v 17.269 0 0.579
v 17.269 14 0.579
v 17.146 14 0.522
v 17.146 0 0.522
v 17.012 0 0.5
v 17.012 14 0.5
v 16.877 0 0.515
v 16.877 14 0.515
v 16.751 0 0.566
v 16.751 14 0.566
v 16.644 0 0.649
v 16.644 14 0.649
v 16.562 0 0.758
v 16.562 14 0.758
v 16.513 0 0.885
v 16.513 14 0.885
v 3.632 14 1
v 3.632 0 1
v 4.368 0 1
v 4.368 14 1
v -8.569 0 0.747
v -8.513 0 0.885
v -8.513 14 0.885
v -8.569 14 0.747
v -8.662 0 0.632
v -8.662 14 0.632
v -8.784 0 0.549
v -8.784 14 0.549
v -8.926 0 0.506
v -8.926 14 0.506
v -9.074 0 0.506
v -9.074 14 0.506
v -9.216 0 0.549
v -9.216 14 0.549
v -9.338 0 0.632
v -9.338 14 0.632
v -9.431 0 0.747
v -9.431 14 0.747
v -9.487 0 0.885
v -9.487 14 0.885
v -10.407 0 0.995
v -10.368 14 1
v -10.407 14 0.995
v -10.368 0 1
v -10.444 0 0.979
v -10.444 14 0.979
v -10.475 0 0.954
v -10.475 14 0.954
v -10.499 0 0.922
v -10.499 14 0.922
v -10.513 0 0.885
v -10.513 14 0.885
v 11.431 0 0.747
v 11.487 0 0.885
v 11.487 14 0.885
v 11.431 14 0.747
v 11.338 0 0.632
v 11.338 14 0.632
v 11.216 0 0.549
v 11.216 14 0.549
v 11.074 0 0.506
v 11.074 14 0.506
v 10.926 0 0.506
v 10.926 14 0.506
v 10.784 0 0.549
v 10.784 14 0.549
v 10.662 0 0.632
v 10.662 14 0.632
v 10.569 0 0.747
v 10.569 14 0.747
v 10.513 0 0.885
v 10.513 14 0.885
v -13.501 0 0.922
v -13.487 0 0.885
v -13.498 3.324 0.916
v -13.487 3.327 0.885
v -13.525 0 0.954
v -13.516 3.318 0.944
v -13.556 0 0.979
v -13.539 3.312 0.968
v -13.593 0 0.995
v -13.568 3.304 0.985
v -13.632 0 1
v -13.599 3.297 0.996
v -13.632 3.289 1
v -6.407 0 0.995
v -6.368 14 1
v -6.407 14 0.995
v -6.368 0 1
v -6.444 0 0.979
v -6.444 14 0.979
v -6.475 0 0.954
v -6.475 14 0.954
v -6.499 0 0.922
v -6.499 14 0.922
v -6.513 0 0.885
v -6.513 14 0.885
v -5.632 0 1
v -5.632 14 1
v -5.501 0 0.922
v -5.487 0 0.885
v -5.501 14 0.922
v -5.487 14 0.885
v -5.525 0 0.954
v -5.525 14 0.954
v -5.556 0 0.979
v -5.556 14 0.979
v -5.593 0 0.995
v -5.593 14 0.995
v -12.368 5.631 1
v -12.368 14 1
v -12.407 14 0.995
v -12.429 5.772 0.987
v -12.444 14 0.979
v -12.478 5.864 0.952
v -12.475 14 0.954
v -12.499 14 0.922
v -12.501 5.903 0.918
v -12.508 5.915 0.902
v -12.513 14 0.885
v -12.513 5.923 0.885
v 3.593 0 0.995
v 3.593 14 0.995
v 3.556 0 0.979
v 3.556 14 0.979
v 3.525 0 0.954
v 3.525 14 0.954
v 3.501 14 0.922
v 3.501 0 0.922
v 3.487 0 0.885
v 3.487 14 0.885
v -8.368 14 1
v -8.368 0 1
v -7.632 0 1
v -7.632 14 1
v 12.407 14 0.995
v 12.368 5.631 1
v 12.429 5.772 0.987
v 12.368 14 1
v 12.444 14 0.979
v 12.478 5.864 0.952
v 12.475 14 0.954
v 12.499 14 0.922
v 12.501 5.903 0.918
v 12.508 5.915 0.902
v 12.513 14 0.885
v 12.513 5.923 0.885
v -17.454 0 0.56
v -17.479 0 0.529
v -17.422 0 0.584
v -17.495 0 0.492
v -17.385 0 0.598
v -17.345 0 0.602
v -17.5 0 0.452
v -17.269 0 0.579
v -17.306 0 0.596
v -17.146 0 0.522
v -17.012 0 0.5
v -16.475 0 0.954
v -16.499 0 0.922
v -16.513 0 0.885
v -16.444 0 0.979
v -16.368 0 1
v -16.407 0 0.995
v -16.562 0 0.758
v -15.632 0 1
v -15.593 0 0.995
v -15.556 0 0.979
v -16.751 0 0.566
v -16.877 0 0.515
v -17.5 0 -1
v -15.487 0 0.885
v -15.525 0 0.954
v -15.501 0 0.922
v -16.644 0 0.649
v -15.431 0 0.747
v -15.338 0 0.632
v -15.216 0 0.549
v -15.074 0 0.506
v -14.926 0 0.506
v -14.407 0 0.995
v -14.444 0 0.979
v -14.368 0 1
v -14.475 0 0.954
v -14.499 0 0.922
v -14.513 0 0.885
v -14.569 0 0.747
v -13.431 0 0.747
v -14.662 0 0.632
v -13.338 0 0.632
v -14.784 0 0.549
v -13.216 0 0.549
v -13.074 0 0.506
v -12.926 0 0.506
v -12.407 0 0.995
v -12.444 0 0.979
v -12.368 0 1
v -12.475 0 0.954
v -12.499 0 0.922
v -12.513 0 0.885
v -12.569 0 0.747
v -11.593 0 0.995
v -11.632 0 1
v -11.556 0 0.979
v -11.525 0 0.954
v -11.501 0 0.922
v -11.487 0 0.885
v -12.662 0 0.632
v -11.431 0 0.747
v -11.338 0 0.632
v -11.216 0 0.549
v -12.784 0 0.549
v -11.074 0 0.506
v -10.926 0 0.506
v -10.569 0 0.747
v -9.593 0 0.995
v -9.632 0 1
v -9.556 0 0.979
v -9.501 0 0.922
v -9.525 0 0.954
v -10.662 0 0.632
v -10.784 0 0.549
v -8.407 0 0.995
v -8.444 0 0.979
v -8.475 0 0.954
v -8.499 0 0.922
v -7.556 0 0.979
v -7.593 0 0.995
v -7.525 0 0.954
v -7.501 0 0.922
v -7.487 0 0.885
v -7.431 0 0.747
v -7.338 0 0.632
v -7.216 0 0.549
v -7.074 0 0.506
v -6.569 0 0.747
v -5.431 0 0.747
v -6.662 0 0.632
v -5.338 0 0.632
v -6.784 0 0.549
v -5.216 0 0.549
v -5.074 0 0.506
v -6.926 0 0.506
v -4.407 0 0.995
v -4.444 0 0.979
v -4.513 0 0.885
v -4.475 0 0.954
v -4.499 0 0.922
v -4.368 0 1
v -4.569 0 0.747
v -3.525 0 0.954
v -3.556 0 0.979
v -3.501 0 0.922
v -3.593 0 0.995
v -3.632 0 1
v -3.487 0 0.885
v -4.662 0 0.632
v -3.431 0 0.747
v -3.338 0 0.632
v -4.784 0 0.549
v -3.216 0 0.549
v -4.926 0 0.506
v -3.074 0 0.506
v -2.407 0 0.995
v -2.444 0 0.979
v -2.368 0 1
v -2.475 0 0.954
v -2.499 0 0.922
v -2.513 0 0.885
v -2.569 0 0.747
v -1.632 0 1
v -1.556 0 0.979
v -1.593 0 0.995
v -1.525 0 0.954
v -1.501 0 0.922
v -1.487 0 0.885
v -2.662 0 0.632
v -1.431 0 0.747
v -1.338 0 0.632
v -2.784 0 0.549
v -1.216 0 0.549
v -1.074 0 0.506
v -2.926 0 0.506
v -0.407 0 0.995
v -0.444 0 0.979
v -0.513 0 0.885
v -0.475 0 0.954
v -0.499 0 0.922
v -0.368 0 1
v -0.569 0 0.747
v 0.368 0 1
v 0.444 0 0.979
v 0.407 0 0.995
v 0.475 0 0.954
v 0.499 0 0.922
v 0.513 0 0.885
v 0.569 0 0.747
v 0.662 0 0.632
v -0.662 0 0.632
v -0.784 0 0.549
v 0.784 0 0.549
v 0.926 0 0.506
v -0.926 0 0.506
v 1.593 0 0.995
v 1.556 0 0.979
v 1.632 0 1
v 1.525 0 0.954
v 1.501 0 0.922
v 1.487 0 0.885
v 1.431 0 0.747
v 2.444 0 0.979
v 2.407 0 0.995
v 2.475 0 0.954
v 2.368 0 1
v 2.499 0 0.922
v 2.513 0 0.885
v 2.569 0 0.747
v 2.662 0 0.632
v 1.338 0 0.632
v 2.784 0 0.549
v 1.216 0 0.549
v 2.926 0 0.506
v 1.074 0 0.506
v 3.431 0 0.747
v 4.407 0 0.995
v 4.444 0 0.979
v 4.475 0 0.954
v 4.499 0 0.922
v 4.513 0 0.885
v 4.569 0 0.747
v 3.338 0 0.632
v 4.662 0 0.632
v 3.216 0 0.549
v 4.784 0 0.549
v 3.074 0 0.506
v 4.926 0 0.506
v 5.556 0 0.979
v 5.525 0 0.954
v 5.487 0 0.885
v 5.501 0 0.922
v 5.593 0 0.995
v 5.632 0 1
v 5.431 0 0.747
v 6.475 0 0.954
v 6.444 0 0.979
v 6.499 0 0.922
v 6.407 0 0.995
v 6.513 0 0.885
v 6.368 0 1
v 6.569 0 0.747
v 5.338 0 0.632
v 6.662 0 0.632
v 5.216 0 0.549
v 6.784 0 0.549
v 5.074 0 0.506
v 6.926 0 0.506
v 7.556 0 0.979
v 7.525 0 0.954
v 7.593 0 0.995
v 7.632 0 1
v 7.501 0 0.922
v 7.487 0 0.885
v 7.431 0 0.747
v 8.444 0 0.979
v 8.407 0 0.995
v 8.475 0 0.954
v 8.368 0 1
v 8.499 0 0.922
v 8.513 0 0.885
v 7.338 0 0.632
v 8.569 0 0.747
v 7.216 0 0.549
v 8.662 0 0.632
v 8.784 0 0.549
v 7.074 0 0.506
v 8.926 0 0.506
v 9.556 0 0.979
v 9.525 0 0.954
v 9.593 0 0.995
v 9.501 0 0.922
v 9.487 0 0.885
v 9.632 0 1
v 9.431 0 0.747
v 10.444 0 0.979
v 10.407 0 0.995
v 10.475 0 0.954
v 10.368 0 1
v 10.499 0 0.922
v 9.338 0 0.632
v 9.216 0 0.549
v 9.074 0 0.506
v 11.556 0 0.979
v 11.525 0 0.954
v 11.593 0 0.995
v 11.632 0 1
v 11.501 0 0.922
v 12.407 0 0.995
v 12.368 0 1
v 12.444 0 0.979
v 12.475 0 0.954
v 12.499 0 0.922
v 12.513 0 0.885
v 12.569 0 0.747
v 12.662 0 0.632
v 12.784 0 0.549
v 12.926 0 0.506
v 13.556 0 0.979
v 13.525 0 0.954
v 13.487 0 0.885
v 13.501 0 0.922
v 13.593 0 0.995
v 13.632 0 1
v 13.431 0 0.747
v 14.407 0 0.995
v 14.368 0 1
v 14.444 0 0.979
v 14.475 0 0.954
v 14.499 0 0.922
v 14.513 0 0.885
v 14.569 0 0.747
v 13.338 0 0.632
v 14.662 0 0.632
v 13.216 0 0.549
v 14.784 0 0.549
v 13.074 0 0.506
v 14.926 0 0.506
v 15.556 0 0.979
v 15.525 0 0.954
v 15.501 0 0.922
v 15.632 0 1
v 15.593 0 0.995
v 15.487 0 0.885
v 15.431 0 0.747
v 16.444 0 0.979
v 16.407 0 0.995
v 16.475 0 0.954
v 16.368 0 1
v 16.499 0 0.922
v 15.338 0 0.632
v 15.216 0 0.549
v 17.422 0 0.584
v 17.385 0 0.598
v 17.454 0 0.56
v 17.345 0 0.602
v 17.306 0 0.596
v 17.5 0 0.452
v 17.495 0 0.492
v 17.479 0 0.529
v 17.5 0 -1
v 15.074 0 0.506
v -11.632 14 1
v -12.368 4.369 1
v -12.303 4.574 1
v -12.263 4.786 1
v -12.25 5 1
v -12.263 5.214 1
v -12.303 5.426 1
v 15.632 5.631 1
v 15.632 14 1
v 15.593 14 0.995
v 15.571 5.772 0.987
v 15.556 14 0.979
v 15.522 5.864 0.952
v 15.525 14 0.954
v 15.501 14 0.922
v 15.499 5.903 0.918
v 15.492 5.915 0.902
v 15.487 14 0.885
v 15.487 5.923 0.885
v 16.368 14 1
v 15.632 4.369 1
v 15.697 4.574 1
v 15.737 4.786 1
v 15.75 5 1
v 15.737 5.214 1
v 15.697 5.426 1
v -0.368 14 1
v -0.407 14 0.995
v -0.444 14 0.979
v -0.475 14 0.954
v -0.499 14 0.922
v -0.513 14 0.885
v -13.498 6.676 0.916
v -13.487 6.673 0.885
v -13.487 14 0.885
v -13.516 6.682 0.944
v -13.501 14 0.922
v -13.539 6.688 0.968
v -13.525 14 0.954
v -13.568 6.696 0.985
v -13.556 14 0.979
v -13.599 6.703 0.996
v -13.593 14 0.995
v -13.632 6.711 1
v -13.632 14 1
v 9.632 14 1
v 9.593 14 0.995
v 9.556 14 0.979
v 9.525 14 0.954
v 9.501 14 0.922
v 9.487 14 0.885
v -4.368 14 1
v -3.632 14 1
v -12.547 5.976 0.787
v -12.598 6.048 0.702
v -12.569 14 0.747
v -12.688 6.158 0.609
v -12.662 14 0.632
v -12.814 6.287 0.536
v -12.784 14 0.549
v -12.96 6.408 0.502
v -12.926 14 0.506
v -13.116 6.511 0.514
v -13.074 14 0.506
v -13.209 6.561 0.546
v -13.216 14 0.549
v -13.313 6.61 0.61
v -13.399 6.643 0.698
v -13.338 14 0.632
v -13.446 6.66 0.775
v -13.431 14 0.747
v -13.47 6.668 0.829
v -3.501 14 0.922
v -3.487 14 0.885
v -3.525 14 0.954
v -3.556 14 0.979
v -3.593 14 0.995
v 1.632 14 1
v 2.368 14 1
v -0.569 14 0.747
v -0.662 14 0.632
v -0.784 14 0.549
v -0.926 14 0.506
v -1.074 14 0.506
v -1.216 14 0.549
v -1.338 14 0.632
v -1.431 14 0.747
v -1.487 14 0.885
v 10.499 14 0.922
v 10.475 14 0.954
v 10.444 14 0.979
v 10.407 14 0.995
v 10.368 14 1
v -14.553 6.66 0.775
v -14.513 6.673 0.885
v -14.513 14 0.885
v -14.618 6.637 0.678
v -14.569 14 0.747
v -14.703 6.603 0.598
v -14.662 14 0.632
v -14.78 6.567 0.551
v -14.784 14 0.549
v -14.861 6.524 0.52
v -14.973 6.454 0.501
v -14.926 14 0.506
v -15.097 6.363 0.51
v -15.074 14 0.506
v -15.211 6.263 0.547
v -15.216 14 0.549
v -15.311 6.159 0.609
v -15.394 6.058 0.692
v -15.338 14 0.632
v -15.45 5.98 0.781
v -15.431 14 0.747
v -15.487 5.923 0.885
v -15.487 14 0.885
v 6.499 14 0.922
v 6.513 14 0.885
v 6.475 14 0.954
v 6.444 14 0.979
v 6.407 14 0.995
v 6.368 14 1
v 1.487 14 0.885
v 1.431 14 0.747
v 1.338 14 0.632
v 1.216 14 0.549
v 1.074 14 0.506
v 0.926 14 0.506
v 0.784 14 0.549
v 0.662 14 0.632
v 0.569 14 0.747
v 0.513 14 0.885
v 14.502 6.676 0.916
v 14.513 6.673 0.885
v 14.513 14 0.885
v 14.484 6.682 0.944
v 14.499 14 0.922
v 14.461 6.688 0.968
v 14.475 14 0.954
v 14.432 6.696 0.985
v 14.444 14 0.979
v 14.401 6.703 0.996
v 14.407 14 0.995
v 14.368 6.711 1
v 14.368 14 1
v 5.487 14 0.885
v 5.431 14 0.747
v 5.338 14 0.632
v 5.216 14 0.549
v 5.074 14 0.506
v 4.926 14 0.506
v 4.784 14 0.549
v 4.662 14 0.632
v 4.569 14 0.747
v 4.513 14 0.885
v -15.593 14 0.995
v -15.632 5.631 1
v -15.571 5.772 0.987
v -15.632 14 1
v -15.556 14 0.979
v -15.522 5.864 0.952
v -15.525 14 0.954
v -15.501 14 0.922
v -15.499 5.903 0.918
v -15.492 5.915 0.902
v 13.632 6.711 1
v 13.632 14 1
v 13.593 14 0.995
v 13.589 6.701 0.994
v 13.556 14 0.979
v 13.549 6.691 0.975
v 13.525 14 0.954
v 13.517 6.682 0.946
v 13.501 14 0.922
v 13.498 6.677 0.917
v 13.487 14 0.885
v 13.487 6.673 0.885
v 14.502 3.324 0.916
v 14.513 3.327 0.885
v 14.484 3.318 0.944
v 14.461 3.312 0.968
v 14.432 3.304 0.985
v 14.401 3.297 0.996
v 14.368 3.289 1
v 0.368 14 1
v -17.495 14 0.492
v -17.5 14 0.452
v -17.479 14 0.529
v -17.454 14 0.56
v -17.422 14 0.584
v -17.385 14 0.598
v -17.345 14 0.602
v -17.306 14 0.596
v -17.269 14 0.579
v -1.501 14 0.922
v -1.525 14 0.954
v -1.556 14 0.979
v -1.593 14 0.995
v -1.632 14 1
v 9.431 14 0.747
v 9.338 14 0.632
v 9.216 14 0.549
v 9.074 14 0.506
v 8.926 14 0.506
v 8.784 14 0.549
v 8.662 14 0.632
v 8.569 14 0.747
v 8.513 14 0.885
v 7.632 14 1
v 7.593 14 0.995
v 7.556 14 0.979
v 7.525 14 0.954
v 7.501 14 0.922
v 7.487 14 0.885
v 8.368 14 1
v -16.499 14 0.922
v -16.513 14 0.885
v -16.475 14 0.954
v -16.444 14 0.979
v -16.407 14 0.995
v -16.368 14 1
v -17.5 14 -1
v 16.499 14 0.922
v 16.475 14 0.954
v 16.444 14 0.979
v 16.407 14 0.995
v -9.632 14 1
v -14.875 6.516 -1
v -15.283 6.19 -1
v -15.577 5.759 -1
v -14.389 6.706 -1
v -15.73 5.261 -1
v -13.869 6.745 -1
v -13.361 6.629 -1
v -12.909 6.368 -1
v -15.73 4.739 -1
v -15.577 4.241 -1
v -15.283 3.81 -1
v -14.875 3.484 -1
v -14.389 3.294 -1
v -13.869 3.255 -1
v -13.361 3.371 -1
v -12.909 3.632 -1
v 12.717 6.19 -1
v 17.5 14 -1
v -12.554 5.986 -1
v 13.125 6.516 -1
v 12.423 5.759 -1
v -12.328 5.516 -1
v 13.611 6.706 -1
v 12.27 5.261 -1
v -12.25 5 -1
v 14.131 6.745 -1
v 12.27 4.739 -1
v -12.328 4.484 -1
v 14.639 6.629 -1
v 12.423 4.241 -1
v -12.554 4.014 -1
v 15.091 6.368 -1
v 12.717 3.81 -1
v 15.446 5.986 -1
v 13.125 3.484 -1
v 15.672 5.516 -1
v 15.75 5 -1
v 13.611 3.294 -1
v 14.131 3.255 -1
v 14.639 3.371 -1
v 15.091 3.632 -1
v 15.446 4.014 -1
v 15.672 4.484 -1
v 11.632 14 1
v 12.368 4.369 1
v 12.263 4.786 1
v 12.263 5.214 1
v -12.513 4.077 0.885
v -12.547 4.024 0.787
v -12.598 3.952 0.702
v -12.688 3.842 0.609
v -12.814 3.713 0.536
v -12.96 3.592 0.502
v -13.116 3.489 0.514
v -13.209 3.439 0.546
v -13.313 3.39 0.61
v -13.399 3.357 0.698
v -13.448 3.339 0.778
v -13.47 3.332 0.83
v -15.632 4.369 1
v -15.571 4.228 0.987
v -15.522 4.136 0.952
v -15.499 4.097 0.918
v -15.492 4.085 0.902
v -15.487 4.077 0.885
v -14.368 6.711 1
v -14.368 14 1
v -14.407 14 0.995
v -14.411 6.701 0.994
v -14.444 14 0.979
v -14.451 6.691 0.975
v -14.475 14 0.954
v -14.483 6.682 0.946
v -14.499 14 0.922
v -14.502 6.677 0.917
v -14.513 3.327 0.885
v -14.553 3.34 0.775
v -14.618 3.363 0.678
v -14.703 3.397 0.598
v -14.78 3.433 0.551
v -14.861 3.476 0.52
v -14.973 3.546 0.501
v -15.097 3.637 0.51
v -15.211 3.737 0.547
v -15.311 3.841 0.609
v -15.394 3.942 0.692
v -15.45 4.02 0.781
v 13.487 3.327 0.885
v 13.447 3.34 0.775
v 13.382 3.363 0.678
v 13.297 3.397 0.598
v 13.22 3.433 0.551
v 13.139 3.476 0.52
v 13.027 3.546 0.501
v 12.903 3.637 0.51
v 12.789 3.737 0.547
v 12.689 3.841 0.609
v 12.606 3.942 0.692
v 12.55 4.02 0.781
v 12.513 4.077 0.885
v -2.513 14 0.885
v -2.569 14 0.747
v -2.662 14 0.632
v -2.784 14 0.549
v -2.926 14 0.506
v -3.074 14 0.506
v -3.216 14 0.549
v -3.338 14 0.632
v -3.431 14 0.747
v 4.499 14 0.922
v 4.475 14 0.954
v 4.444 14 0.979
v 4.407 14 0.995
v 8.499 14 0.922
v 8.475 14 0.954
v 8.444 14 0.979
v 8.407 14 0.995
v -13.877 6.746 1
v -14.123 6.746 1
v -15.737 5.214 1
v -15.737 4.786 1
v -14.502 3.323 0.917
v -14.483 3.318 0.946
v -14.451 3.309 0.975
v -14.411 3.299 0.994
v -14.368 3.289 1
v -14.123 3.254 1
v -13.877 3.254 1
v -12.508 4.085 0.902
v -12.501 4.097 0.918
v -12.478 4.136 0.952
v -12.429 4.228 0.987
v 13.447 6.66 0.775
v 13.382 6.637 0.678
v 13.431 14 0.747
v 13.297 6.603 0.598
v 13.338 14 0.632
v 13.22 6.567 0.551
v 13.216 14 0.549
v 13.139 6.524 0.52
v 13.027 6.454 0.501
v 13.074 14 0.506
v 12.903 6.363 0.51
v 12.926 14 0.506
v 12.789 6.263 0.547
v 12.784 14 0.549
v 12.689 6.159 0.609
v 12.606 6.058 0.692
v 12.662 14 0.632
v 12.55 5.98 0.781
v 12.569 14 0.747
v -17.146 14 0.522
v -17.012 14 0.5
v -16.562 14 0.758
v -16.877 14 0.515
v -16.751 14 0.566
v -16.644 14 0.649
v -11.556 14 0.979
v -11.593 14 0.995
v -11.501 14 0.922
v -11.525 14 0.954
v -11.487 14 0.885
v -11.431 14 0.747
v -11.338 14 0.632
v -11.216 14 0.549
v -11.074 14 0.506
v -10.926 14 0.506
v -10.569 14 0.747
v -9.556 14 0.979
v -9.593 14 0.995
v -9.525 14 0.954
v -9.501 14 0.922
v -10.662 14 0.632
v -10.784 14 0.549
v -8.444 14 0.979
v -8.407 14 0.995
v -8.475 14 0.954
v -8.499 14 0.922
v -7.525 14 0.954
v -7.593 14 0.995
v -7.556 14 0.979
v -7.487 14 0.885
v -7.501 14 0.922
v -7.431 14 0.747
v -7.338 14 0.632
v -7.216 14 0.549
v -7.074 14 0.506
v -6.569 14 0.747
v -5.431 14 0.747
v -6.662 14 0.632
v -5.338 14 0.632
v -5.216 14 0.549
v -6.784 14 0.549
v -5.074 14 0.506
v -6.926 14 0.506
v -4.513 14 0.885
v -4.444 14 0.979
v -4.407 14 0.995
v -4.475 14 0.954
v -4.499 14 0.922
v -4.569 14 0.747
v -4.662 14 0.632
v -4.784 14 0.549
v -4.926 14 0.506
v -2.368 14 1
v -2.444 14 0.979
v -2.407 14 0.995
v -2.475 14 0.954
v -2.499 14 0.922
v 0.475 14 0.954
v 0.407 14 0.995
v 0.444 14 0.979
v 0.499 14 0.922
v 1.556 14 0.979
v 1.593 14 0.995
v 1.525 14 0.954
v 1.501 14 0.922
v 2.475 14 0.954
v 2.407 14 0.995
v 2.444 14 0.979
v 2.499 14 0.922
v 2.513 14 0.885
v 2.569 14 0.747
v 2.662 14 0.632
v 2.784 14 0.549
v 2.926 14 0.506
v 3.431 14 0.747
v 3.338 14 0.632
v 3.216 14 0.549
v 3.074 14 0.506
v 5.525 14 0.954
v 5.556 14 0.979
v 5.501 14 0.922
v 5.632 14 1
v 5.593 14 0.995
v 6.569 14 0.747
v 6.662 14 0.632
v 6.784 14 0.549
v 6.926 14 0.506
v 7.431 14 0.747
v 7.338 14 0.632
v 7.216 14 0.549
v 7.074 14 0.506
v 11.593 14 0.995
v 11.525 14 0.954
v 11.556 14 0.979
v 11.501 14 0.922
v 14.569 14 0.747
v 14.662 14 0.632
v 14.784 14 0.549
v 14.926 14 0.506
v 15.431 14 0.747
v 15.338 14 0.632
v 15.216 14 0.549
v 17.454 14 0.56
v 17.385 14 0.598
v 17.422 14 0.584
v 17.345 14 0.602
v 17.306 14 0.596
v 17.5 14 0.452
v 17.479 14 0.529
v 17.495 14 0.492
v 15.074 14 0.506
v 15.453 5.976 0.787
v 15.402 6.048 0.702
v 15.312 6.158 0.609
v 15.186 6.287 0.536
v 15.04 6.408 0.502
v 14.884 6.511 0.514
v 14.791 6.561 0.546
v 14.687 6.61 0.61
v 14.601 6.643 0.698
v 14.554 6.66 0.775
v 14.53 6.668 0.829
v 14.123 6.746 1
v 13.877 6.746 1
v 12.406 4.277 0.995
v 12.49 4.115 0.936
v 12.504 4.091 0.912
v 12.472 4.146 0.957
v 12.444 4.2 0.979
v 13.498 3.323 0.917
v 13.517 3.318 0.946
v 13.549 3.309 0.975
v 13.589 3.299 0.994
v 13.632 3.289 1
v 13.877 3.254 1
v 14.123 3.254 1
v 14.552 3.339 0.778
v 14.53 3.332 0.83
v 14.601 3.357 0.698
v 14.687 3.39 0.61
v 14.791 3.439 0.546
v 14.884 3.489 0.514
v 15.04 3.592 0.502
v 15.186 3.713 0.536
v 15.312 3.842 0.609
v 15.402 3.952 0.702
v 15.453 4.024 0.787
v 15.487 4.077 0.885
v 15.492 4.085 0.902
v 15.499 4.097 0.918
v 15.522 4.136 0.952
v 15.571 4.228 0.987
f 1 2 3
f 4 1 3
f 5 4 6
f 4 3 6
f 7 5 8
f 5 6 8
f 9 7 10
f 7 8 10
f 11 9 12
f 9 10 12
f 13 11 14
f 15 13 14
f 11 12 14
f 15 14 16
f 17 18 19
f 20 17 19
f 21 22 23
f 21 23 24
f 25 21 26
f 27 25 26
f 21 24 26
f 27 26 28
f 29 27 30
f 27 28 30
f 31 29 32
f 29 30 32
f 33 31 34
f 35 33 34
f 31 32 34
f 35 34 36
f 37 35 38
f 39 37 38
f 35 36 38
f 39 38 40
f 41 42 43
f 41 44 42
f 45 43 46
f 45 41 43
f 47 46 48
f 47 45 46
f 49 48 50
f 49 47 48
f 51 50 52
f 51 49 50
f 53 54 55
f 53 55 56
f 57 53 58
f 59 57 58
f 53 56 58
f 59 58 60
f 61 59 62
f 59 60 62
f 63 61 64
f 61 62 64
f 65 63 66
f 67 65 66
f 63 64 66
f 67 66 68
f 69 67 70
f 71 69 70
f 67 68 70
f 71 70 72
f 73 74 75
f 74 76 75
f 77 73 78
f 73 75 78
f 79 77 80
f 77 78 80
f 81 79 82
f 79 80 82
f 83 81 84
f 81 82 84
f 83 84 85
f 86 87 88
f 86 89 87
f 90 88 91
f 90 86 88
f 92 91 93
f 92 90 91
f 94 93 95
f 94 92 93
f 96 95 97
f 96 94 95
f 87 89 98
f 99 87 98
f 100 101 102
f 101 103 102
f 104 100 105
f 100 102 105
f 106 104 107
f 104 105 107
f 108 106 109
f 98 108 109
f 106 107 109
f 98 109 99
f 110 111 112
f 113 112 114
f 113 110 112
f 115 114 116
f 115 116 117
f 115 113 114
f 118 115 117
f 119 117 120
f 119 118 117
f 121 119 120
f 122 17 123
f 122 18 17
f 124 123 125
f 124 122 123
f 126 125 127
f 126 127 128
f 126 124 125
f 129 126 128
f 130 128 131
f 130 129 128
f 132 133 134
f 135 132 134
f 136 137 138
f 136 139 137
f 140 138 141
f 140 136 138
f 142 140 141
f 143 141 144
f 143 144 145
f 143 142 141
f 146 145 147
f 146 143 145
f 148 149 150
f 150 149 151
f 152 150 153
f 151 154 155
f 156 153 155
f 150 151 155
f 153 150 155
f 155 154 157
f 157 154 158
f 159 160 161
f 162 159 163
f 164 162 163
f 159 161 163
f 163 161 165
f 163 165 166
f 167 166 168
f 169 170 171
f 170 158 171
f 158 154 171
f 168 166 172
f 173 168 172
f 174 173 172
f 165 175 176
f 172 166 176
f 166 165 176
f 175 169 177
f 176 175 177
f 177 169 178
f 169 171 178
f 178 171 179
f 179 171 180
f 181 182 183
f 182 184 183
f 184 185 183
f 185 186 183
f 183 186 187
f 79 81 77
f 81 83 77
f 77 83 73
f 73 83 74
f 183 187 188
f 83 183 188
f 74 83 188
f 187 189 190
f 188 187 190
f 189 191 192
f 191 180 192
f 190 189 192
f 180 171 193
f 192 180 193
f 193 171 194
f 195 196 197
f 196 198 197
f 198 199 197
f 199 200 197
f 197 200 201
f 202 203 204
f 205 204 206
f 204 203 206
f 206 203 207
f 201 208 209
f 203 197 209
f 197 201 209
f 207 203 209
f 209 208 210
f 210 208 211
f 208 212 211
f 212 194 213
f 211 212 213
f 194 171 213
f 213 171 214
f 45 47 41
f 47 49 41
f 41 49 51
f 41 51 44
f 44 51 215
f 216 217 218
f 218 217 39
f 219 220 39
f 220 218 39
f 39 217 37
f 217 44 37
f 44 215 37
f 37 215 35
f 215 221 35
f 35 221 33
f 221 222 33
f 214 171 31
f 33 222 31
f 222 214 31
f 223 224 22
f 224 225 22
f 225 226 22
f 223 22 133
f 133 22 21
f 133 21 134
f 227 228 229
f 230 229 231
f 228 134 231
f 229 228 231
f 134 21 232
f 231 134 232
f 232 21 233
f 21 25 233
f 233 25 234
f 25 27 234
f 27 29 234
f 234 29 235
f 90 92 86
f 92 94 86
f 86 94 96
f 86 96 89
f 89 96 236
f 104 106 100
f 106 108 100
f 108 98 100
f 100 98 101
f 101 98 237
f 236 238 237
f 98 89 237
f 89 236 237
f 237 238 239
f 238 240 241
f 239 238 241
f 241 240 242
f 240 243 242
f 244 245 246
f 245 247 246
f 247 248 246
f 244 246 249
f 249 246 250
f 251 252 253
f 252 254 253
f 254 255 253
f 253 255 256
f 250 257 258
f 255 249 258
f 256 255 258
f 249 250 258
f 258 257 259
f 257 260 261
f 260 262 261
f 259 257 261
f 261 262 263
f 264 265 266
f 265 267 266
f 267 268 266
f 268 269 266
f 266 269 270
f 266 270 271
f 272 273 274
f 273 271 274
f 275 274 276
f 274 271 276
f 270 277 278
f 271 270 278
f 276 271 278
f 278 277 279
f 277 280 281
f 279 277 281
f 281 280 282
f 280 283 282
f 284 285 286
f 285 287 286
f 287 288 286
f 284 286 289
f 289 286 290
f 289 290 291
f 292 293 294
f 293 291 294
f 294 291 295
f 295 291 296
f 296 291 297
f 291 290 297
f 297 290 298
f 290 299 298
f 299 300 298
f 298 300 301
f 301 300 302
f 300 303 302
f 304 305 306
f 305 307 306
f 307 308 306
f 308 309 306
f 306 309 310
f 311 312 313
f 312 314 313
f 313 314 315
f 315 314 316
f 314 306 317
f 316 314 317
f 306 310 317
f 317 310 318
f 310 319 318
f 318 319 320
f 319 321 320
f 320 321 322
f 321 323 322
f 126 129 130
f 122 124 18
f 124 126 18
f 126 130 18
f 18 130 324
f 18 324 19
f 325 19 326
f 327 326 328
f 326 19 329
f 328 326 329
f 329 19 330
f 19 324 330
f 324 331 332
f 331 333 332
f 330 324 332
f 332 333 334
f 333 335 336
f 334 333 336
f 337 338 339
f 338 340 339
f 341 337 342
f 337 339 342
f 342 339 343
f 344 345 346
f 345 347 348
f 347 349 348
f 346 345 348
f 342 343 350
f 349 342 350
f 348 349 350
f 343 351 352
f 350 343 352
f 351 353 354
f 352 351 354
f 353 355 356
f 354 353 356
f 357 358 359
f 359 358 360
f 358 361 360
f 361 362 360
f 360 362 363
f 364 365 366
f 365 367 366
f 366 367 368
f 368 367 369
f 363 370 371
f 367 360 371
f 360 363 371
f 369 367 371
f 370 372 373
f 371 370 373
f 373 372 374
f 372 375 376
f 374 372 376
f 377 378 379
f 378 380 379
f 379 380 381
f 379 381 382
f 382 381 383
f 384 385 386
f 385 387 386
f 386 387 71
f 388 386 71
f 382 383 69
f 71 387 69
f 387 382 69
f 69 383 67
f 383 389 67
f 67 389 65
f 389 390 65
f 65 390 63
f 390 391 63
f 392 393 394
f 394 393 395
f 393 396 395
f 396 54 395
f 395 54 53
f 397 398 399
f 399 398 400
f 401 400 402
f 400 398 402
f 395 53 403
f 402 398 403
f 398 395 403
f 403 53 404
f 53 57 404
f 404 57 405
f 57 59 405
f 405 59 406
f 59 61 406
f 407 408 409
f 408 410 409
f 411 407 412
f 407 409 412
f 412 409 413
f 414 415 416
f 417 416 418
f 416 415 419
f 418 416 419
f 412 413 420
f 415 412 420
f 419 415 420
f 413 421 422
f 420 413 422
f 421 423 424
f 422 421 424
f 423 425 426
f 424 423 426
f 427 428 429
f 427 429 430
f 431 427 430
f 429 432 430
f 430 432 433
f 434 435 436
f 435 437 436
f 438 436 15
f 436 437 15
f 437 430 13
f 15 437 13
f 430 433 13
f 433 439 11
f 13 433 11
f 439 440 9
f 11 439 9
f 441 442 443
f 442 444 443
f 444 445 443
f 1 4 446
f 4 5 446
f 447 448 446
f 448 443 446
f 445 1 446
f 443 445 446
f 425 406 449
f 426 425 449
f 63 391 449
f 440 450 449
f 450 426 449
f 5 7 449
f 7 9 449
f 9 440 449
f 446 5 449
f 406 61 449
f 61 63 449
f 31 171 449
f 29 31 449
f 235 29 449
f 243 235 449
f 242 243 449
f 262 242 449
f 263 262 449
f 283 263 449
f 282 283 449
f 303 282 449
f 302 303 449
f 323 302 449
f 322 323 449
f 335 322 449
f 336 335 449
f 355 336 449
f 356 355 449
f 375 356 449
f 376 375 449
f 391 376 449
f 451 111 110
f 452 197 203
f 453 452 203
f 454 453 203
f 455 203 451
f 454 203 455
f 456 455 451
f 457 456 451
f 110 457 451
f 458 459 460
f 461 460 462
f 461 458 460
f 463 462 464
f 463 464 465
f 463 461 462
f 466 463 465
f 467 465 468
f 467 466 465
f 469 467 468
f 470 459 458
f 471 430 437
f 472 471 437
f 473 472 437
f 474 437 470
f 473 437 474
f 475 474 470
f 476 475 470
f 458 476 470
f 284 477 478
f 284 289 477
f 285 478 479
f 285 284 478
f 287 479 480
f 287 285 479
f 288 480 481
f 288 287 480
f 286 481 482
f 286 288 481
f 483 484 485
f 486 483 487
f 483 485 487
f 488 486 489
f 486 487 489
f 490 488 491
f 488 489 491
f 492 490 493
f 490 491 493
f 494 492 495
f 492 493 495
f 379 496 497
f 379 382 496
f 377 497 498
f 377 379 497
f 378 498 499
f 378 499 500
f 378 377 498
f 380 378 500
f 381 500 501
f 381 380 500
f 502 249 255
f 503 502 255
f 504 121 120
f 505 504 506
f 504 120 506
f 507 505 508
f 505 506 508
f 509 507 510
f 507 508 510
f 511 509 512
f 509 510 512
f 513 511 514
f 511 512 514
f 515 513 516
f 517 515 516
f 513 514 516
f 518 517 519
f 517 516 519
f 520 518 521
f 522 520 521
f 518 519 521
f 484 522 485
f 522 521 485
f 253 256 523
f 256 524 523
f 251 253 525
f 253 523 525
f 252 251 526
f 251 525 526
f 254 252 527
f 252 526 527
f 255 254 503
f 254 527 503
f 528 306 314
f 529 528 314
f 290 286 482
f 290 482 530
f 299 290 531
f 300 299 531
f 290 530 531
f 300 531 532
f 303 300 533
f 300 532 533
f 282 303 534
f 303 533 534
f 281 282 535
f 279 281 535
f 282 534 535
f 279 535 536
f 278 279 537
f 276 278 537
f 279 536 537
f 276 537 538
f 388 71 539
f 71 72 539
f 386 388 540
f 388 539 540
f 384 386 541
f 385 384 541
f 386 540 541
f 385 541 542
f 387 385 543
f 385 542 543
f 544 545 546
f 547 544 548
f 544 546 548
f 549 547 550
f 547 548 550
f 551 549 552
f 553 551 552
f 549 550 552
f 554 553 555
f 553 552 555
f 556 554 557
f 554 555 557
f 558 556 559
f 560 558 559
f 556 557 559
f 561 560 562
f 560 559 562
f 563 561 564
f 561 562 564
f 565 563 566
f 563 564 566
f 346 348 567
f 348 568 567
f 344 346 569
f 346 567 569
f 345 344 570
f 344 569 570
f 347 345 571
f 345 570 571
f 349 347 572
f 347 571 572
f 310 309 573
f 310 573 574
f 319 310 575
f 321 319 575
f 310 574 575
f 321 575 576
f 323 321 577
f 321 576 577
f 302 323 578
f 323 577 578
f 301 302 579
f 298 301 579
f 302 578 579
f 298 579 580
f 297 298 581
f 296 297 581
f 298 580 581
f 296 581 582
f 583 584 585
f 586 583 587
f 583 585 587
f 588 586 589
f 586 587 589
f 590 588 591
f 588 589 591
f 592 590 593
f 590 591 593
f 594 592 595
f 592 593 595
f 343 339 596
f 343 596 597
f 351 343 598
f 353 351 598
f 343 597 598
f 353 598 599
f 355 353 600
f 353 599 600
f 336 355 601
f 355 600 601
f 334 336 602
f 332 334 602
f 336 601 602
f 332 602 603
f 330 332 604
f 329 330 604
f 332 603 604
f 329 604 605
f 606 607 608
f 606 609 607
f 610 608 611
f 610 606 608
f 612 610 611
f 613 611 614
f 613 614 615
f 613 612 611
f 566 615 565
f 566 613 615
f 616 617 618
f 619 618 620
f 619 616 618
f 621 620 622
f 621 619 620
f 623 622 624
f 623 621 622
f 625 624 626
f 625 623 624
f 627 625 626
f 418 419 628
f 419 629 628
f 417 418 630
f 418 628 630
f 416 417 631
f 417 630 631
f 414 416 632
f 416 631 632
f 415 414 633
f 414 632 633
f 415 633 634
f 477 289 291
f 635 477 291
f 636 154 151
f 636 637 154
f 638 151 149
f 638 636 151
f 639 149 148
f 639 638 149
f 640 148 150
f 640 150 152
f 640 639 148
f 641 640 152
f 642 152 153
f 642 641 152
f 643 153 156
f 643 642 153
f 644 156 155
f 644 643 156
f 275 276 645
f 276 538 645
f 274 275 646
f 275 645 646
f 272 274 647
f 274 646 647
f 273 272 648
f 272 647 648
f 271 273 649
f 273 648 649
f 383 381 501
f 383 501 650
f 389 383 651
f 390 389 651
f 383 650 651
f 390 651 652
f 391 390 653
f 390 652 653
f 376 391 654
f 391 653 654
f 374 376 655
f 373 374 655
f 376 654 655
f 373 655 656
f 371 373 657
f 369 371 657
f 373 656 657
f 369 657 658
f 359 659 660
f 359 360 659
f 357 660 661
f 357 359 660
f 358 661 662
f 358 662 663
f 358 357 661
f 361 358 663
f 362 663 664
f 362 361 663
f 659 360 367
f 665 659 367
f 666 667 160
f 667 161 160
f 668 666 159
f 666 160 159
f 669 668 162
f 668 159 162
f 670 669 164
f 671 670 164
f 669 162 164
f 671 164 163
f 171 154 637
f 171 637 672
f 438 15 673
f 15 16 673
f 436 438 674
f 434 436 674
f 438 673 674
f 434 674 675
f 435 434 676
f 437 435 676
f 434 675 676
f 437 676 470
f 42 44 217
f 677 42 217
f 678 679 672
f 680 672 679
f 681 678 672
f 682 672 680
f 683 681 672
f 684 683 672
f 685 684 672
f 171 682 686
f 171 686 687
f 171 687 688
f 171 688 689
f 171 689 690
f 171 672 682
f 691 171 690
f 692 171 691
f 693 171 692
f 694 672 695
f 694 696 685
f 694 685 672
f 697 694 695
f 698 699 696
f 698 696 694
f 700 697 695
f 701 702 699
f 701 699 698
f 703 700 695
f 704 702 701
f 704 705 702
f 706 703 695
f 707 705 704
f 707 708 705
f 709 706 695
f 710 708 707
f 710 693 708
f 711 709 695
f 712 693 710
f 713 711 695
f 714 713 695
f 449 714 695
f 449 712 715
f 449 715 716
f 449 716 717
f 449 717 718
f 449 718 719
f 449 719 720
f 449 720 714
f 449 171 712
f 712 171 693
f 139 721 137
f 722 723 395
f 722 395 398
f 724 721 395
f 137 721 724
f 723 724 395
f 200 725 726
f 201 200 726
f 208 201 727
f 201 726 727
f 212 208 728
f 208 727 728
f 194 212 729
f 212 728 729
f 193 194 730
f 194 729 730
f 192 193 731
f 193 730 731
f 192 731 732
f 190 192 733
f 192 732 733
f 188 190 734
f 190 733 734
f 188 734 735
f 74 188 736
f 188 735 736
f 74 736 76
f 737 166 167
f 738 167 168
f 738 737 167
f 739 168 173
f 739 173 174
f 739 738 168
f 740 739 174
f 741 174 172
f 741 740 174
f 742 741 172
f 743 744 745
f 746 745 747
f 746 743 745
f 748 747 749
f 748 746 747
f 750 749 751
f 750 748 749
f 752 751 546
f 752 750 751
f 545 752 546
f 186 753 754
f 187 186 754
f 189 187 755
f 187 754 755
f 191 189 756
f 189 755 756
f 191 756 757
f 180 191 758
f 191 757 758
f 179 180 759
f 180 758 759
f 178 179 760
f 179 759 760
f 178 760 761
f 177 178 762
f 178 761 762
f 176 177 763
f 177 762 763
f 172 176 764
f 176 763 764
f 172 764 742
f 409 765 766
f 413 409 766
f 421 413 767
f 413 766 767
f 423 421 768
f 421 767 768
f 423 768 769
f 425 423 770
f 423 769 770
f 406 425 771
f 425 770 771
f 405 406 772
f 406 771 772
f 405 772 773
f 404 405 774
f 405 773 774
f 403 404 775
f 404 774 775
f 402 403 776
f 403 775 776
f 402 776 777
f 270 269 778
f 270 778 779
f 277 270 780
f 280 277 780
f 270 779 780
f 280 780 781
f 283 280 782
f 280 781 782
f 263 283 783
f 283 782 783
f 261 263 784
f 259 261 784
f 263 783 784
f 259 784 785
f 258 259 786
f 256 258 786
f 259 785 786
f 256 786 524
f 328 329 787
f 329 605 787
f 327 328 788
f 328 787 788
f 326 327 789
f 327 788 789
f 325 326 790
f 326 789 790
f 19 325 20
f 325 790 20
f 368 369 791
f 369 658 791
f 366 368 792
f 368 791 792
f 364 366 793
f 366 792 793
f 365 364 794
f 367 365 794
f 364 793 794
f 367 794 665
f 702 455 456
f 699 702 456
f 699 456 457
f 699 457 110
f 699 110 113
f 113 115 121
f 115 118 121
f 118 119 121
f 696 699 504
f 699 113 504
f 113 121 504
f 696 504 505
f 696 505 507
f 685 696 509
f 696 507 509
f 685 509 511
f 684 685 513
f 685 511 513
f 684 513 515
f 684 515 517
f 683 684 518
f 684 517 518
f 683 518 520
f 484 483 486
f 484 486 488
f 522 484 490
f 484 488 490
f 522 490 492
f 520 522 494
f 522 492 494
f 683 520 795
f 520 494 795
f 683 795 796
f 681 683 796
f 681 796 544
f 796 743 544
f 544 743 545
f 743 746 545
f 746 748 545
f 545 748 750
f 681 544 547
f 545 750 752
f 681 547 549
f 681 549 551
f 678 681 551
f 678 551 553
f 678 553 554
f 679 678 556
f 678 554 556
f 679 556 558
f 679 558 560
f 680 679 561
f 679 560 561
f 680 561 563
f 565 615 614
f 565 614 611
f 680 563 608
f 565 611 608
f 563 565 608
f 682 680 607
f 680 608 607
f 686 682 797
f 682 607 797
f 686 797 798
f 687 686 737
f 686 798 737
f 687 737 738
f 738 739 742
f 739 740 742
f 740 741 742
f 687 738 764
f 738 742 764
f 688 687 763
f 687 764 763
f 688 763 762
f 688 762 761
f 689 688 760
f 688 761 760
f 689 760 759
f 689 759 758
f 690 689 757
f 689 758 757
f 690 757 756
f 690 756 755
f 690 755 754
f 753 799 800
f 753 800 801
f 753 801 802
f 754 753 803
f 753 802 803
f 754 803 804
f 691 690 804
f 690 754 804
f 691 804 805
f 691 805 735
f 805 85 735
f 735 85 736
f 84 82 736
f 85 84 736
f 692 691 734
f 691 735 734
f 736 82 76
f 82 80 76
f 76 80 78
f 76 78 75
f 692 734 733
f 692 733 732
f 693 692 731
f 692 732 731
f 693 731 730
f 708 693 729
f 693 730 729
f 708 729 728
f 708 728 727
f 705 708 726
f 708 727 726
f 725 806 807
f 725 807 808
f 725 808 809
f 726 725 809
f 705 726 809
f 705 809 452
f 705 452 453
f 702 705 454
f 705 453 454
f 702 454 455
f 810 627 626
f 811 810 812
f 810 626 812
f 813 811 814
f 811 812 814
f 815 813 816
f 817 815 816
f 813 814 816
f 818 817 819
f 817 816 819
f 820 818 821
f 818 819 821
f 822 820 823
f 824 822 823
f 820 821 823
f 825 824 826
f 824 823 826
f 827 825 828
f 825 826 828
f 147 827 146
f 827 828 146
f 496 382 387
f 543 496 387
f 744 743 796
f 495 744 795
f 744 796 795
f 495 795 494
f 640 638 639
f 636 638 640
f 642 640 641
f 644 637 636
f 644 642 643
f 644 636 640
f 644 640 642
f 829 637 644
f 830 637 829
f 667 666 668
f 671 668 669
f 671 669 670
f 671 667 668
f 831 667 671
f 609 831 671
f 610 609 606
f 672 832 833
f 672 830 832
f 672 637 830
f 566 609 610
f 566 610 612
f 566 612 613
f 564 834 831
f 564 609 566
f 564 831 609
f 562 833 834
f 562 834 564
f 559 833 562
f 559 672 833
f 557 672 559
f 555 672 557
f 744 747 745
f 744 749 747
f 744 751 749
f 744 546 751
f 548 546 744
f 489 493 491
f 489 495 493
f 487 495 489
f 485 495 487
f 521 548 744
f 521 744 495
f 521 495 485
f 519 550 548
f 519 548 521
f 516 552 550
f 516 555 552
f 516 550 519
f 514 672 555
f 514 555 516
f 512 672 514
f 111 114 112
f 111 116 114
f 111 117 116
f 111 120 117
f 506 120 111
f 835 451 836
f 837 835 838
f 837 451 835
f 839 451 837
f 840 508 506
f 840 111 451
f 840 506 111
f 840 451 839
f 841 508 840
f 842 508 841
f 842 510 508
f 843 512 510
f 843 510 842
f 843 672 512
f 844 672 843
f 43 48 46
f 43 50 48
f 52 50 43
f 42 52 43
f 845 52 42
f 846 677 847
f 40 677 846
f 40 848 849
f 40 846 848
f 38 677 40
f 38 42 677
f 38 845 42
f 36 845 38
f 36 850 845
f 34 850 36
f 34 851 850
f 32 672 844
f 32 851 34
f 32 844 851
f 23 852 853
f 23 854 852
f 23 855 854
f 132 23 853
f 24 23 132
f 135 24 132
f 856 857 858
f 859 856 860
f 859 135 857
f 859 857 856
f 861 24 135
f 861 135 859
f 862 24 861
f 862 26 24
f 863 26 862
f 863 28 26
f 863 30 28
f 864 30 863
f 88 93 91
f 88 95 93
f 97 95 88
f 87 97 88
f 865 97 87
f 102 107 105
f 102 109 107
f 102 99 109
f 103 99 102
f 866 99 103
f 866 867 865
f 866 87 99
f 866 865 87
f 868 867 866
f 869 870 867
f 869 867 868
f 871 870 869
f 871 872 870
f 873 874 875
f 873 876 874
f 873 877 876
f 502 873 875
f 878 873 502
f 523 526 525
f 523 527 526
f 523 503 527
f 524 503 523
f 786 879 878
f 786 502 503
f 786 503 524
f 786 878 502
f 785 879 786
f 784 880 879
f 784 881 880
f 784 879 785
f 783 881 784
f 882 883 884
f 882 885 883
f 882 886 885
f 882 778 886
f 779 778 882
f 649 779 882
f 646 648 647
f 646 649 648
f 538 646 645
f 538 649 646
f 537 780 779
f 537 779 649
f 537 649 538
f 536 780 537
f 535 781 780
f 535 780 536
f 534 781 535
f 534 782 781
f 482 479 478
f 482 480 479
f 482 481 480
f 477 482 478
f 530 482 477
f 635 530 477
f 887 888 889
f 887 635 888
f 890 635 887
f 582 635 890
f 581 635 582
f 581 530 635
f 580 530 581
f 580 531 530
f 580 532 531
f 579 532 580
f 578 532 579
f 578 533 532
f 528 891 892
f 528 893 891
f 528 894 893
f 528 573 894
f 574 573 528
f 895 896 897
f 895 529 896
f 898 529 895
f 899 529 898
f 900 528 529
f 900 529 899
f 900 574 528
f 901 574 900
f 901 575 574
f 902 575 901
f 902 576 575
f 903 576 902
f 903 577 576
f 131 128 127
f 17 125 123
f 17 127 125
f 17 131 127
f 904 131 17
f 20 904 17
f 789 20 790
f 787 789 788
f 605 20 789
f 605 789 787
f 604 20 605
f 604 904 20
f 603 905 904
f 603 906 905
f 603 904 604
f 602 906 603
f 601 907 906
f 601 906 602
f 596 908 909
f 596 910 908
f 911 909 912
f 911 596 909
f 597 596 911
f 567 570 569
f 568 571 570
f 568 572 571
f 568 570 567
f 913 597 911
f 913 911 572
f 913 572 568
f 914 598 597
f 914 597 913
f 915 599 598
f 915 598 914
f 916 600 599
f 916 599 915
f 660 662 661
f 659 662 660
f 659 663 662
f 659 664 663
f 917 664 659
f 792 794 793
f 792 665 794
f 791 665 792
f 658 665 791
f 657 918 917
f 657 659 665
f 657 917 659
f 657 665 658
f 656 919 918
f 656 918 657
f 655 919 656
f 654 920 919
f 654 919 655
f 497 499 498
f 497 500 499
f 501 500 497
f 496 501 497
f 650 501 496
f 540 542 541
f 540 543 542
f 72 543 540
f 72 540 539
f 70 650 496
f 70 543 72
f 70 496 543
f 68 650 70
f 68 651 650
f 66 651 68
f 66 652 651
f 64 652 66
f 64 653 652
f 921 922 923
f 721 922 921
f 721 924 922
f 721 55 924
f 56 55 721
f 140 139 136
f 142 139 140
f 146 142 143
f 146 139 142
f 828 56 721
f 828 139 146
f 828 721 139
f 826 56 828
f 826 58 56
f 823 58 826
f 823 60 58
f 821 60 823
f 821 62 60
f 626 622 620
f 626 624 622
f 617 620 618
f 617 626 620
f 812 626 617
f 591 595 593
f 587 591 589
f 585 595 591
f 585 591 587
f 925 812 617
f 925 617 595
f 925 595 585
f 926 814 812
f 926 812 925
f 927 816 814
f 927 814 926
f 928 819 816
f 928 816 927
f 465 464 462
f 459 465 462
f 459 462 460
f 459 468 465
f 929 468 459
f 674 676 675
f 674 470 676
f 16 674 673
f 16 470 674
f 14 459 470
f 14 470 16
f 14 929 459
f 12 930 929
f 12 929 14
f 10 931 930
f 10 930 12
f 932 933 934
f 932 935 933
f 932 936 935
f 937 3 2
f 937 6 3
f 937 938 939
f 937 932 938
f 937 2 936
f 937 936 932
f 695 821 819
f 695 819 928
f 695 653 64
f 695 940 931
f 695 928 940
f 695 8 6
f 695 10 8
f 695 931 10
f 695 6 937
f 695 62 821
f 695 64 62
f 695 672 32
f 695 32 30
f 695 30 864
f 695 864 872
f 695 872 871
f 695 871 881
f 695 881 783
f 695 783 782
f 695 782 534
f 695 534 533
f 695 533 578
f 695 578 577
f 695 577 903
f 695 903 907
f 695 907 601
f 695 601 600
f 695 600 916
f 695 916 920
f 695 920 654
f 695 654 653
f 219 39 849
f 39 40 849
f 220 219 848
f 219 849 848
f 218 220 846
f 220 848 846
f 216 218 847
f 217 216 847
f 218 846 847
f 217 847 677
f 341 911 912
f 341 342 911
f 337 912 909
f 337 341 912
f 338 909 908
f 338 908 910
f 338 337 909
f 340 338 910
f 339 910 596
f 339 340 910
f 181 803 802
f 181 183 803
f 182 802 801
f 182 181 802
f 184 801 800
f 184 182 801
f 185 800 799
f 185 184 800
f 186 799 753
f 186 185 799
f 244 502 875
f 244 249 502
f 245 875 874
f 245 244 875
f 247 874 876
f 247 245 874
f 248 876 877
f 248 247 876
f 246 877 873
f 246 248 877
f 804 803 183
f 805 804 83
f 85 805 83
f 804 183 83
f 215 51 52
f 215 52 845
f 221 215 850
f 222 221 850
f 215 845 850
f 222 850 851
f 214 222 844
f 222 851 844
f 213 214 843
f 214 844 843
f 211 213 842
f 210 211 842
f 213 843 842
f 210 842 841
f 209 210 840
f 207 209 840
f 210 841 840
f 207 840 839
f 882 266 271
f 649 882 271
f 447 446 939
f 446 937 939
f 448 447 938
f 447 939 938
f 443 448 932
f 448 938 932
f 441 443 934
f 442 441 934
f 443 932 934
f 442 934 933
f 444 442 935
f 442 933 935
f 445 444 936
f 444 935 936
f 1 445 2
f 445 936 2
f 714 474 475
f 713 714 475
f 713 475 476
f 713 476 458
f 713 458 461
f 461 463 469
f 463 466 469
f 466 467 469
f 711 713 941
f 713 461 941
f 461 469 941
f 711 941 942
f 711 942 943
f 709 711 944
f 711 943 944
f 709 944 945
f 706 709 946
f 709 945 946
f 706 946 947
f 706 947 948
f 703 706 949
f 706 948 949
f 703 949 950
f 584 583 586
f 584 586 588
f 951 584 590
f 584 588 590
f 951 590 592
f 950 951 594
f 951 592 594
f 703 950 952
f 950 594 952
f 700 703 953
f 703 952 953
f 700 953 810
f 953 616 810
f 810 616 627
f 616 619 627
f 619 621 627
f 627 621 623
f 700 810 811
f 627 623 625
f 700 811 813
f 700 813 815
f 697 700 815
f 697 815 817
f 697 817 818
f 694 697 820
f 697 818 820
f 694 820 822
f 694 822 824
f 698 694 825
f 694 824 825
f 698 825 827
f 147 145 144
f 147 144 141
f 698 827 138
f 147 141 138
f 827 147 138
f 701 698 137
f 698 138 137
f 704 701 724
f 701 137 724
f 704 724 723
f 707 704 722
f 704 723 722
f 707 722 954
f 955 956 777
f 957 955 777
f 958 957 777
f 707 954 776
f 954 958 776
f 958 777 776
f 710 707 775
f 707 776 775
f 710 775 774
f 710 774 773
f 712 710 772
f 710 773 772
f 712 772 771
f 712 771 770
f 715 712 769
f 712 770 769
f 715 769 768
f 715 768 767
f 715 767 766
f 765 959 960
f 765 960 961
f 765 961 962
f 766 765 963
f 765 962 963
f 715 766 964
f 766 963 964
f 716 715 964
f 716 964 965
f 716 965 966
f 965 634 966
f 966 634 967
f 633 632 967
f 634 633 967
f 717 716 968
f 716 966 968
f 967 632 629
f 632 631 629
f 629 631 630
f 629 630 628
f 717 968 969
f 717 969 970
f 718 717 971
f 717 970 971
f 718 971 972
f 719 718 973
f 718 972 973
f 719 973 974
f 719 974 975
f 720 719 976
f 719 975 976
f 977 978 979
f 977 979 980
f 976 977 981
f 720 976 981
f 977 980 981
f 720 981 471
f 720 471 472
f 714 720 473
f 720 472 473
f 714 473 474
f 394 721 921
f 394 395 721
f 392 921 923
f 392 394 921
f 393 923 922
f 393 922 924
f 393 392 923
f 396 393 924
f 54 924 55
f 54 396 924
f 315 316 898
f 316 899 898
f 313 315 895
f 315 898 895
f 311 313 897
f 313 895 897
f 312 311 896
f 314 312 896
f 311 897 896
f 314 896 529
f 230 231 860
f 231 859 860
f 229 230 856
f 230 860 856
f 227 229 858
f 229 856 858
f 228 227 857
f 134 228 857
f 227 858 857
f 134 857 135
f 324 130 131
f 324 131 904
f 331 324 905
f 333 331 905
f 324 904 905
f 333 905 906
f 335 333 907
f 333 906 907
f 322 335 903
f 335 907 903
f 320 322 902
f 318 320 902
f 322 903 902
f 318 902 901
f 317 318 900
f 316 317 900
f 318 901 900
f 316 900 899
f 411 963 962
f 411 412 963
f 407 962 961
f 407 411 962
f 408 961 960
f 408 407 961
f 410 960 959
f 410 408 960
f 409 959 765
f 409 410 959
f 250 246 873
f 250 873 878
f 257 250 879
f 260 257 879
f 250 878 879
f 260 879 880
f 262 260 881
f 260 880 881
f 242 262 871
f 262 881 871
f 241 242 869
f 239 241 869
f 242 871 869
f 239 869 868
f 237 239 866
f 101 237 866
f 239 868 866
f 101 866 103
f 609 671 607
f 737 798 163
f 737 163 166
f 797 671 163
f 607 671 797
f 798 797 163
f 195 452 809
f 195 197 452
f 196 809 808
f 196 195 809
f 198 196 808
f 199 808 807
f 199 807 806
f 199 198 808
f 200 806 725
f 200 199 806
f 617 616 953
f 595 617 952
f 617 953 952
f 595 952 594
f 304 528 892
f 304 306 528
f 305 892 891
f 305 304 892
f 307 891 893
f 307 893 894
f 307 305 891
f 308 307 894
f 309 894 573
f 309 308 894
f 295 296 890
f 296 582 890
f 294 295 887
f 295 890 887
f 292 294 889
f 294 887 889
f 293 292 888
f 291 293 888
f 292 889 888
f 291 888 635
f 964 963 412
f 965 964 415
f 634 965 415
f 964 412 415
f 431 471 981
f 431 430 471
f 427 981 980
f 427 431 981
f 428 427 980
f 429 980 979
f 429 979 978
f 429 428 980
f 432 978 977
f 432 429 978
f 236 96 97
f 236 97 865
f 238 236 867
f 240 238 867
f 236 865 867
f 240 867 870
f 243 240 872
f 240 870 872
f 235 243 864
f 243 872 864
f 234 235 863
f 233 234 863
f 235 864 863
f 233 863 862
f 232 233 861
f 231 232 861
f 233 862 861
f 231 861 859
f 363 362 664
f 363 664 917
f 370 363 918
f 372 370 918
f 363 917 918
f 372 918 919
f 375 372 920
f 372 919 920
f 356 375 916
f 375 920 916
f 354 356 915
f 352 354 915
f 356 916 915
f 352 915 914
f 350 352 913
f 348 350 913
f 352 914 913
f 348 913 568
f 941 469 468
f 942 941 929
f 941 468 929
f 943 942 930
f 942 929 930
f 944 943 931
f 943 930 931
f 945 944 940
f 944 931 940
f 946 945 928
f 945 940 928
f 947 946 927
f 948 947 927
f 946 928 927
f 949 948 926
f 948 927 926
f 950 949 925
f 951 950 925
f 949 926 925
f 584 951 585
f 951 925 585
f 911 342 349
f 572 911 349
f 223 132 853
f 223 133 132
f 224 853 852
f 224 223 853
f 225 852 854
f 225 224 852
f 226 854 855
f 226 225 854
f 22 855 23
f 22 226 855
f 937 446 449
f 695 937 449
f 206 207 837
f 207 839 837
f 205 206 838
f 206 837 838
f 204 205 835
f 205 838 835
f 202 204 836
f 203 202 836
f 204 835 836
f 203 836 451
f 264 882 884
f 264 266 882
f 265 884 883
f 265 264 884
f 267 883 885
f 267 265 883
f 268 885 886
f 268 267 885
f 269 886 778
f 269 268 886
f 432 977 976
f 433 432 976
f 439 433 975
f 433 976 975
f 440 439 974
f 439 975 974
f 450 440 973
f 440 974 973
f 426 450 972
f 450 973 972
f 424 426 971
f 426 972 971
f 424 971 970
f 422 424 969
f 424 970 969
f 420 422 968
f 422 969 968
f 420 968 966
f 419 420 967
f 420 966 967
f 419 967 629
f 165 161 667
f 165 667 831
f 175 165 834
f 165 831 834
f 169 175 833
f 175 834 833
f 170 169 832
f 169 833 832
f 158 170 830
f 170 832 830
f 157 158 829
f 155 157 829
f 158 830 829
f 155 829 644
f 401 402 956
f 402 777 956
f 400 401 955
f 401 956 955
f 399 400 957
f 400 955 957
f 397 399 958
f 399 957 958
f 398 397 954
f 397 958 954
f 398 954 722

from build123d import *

# Parameters (mm, degrees)
SKETCH1_W           = 35
SKETCH1_H           = 2
BOSS_EXTRUDE1_DEPTH = 14
SKETCH2_R           = 1.75
CUT_EXTRUDE1_DEPTH  = 14
SKETCH3_R           = 0.5
CUT_EXTRUDE2_DEPTH  = 23.433234274
LPATTERN1_COUNT     = 18
LPATTERN1_PITCH     = 2
FILLET1_R           = 0.15


with BuildPart() as part:
    # Sketch1 → Boss-Extrude1 (new body)
    with BuildSketch(Plane(origin=(0, 0, 0), x_dir=(1, 0, 0), z_dir=(0, 1, 0))):
        Rectangle(SKETCH1_W, SKETCH1_H)
    extrude(amount=BOSS_EXTRUDE1_DEPTH)

    # Sketch2 → Cut-Extrude1 (cut)
    with BuildSketch(Plane.XY.offset(1)):
        with Locations((-14, 5)):
            Circle(SKETCH2_R)
        with Locations((14, 5)):
            Circle(SKETCH2_R)
    extrude(amount=-CUT_EXTRUDE1_DEPTH, mode=Mode.SUBTRACT)

    # Sketch3 → Cut-Extrude2 (cut, through all)
    with BuildSketch(Plane(origin=(0, 14, 0), x_dir=(1, 0, 0), z_dir=(0, 1, 0))):
        with Locations((-17, -1)):
            Circle(SKETCH3_R)
    cut_extrude2 = extrude(amount=-CUT_EXTRUDE2_DEPTH, mode=Mode.SUBTRACT)

    # LPattern1: Cut-Extrude2 ×18
    with Locations(*[(i * LPATTERN1_PITCH, 0, 0) for i in range(1, LPATTERN1_COUNT)]):
        add(cut_extrude2, mode=Mode.SUBTRACT)

    # Fillet1
    fillet1_edges = [part.edges().sort_by_distance(p)[0] for p in [
        (-16.5, 7, 1),
        (-17.5, 7, 1),
        (-14.5, 10.338525492, 1),
        (-15.5, 9.950693909, 1),
        (13.5, 1.661474508, 1),
        (12.5, 2.049306091, 1),
        (15.5, 2.049306091, 1),
        (14.5, 1.661474508, 1),
        (17.5, 7, 1),
        (16.5, 7, 1),
        (15.5, 9.950693909, 1),
        (14.5, 10.338525492, 1),
        (13.5, 10.338525492, 1),
        (12.5, 9.950693909, 1),
        (11.5, 7, 1),
        (10.5, 7, 1),
        (9.5, 7, 1),
        (8.5, 7, 1),
        (7.5, 7, 1),
        (6.5, 7, 1),
        (5.5, 7, 1),
        (4.5, 7, 1),
        (3.5, 7, 1),
        (2.5, 7, 1),
        (1.5, 7, 1),
        (0.5, 7, 1),
        (-0.5, 7, 1),
        (-1.5, 7, 1),
        (-2.5, 7, 1),
        (-3.5, 7, 1),
        (-4.5, 7, 1),
        (-5.5, 7, 1),
        (-6.5, 7, 1),
        (-7.5, 7, 1),
        (-8.5, 7, 1),
        (-9.5, 7, 1),
        (-12.5, 9.950693909, 1),
        (-13.5, 10.338525492, 1),
        (-10.5, 7, 1),
        (-11.5, 7, 1),
        (-12.5, 2.049306091, 1),
        (-13.5, 1.661474508, 1),
        (-14.5, 1.661474508, 1),
        (-15.5, 2.049306091, 1),
    ]]
    fillet(fillet1_edges, radius=FILLET1_R)


solid = part.part
